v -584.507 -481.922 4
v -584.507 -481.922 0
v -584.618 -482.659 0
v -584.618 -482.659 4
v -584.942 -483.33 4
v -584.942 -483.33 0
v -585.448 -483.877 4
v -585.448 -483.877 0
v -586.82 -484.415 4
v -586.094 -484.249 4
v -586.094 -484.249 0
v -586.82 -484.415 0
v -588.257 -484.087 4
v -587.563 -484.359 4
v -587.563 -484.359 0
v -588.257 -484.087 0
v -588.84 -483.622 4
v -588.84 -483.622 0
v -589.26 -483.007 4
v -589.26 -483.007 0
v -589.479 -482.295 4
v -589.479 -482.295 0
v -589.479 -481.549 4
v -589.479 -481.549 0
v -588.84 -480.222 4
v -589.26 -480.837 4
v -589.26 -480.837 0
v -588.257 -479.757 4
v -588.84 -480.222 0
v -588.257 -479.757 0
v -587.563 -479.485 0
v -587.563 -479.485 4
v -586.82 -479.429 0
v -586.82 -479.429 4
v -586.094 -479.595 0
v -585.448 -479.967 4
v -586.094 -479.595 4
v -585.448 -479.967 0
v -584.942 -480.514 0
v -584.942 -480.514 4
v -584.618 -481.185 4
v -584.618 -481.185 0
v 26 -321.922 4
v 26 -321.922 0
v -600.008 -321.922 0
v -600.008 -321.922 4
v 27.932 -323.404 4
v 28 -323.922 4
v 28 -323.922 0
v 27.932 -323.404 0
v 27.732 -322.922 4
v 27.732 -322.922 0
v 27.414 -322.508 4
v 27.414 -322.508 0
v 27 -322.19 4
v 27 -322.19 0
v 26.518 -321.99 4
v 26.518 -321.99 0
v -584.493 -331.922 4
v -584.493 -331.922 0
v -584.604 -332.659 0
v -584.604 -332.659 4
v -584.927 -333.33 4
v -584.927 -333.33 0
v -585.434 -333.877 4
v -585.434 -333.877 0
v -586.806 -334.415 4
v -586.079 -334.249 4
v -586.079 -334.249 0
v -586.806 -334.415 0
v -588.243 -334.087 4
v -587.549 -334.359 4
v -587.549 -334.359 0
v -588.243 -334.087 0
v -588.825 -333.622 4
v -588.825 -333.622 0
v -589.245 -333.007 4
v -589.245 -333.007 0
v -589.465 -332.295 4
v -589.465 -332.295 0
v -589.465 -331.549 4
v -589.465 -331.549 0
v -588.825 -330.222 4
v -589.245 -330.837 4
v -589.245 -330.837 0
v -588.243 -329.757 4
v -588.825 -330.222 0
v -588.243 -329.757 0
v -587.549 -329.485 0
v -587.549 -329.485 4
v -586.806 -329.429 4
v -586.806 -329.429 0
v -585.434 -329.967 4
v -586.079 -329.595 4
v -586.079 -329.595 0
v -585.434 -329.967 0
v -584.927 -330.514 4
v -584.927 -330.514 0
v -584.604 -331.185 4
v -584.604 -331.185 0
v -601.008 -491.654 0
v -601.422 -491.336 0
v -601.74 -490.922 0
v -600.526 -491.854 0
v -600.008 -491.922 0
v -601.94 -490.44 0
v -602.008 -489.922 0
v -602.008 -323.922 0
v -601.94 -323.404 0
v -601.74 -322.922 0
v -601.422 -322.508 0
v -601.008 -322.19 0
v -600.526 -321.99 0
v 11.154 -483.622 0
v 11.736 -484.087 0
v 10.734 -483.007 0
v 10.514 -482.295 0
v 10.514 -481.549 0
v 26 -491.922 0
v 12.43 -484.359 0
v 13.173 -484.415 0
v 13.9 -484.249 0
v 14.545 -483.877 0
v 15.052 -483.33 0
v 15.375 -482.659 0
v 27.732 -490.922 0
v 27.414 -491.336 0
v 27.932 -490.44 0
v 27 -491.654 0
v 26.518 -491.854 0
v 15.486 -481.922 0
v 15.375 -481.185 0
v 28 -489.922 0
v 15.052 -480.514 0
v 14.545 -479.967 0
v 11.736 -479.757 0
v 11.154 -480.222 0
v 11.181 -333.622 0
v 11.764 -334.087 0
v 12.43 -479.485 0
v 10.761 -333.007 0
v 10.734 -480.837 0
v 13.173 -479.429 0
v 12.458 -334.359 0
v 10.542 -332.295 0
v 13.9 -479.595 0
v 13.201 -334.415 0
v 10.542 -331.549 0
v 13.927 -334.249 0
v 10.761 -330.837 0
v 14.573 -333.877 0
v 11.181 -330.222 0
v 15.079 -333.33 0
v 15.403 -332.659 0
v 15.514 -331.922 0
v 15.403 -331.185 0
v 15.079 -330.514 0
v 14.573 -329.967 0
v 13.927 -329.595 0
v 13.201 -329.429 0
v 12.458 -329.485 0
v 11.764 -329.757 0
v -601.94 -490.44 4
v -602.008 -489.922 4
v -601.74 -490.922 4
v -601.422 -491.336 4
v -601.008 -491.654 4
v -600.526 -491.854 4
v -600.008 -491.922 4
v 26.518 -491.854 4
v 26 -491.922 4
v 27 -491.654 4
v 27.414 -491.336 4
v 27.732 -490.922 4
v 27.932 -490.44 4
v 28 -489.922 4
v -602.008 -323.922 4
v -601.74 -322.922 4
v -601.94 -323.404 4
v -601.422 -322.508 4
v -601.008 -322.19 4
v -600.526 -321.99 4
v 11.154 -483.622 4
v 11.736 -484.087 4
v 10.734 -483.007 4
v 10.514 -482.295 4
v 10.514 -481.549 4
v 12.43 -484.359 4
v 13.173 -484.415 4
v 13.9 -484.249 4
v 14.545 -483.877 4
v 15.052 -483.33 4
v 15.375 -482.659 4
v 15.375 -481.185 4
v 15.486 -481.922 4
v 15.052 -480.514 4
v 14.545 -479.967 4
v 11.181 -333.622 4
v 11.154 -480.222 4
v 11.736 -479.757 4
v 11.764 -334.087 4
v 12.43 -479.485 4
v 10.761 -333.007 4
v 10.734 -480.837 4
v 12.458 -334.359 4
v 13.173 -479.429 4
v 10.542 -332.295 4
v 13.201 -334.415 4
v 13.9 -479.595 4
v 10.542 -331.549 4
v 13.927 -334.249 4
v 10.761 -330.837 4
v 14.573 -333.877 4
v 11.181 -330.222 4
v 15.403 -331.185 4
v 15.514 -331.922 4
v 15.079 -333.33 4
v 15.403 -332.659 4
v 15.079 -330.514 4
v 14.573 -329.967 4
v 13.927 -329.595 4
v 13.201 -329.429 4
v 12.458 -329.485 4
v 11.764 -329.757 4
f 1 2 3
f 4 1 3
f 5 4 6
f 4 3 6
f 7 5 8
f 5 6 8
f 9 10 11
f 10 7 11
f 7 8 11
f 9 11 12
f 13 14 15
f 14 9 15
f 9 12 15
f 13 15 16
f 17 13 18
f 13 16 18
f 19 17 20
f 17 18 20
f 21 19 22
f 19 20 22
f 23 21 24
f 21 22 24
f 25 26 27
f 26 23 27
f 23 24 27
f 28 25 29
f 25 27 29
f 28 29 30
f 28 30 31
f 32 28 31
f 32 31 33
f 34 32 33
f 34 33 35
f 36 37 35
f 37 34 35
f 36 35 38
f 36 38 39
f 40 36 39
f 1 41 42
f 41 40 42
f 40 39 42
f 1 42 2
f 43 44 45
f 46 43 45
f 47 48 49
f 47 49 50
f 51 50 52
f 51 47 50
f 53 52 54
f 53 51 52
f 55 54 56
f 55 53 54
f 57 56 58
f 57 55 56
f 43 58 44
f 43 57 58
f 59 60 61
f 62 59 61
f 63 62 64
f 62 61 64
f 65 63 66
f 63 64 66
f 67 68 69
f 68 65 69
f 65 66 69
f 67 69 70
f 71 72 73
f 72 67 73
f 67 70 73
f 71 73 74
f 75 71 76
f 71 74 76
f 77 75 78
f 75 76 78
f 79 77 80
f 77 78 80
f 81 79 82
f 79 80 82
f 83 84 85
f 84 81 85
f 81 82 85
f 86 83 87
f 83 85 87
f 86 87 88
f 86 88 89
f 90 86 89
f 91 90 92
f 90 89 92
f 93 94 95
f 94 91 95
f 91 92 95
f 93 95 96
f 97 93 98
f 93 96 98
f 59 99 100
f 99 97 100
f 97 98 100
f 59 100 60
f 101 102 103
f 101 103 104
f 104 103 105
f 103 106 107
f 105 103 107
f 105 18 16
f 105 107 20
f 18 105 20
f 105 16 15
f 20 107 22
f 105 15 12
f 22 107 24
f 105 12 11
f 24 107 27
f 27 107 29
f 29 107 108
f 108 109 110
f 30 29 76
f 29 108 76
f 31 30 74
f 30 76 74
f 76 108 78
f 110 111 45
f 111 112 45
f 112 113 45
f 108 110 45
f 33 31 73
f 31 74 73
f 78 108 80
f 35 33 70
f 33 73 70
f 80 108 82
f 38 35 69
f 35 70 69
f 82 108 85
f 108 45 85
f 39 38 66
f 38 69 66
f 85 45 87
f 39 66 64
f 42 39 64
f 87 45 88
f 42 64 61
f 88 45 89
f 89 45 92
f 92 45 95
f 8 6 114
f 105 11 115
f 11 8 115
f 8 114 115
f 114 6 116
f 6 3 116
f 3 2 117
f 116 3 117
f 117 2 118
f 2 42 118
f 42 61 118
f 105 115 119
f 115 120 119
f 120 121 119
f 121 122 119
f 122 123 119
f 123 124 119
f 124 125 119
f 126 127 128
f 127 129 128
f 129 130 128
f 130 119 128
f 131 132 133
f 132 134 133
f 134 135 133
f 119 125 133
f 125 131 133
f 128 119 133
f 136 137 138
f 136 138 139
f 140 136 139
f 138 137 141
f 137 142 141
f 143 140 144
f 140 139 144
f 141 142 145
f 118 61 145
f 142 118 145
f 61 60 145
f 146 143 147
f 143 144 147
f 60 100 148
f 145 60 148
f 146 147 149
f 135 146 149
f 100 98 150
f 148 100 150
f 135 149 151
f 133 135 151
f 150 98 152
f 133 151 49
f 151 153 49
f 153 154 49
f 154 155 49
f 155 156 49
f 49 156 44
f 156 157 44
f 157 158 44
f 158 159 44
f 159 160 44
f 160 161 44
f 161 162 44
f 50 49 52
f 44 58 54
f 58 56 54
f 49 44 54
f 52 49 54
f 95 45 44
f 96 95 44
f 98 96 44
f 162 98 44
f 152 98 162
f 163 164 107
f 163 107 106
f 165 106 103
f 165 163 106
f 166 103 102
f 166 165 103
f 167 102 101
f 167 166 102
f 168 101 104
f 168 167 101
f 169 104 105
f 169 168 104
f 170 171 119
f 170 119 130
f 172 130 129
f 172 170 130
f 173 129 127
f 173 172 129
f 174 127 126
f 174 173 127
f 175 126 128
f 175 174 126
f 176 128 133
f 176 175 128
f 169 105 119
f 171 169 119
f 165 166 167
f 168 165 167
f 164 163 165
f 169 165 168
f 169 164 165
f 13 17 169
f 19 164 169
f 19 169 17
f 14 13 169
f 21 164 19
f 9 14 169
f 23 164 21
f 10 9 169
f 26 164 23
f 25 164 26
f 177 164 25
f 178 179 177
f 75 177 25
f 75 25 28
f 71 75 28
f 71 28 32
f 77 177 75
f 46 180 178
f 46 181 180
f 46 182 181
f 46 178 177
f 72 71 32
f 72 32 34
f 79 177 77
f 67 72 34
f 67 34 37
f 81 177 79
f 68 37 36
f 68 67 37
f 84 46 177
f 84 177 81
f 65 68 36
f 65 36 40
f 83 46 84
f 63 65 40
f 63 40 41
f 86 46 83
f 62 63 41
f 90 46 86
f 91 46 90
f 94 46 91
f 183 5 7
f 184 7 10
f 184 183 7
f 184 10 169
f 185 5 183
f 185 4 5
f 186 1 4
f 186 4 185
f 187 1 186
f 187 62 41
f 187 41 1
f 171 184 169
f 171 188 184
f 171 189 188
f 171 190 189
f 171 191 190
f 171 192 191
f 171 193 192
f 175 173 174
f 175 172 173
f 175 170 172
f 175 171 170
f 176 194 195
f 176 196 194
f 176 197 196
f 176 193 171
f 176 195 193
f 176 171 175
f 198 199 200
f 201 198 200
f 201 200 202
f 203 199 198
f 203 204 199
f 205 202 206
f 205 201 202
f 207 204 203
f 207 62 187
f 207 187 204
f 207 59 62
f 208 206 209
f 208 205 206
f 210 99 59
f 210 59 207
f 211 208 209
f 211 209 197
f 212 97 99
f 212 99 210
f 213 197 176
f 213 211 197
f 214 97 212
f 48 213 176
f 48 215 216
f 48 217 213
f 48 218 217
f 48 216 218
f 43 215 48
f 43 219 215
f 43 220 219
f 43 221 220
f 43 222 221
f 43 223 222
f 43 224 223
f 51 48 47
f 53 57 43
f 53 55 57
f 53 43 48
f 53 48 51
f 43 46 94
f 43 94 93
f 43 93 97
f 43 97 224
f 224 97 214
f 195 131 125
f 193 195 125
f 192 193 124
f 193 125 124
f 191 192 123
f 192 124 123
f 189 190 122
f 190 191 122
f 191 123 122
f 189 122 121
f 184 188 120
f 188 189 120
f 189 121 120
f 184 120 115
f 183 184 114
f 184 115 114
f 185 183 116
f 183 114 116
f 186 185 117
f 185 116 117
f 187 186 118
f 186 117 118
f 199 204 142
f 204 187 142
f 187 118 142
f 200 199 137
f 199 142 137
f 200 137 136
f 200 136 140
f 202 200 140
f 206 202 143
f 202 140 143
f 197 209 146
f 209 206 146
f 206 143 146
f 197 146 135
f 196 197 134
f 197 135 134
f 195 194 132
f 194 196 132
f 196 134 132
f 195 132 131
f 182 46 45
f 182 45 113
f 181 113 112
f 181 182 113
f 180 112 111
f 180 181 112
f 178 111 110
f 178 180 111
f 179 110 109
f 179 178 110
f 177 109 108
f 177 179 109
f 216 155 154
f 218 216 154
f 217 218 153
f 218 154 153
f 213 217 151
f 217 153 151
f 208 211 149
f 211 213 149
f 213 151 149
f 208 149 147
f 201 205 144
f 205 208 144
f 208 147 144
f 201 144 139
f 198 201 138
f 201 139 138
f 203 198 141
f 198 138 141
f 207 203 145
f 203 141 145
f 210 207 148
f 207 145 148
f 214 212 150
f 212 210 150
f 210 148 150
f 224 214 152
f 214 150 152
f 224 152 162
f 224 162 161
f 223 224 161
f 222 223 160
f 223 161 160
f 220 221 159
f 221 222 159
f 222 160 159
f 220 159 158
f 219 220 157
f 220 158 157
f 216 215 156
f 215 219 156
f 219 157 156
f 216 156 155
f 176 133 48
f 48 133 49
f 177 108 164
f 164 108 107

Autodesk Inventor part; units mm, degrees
ref_plane "YZ Plane" through (0, 0, 0) normal (1, 0, 0) x (0, 1, 0)
ref_plane "XZ Plane" through (0, 0, 0) normal (0, 1, 0) x (-1, 0, 0)
ref_plane "XY Plane" through (0, 0, 0) normal (0, 0, 1) x (1, 0, 0)
sketch "Sketch1" plane through (0, 0, 0) normal (0, 0, 1) x (1, 0, 0)
  line L0 (-601.9604, 0.0293) -> (-602.0117, -529.9707) construction
  line L1 (28, -530) -> (28, 100) construction
  line L2 (-582.8507, 100.0274) -> (-582.9118, -529.9726) construction
  line L3 (-591.0507, 100.0282) -> (-582.8507, 100.0274) construction
  line L4 (-591.0507, 100.0282) -> (-591.1118, -529.9718) construction
  line L5 (-582.9118, -529.9726) -> (-591.1118, -529.9718) construction
  line L6 (17.1933, 99.9429) -> (17.0775, -530.057) construction
  line L7 (8.9933, 99.9444) -> (17.1933, 99.9429) construction
  line L8 (8.9933, 99.9444) -> (8.8775, -530.0555) construction
  line L9 (17.0775, -530.057) -> (8.8775, -530.0555) construction
  line L10 (12.9775, -530.0563) -> (13.0933, 99.9437) construction
  line L11 (-587.0118, -529.9722) -> (-586.9507, 100.0278) construction
  line L12 (-602.0081, -491.922) -> (28, -491.922)
  line L13 (28, -491.922) -> (28, -321.922)
  line L14 (28, -321.922) -> (-602.0081, -321.922)
  line L15 (-602.0081, -321.922) -> (-602.0081, -491.922)
  circle A0 centre (-587.0071, -481.922) radius 2.5
  circle A1 centre (-586.9926, -331.922) radius 2.5
  circle A2 centre (12.9863, -481.922) radius 2.5
  circle A3 centre (13.0139, -331.922) radius 2.5
  point P0 (0, 0)
  dimension "d0" = 170
  dimension "d1" = 5
  dimension "d2" = 5
  dimension "d3" = 5
  dimension "d4" = 5
  dimension "d5" = 10
  dimension "d6" = 10
  dimension "d7" = 10
  dimension "d8" = 10
extrude "Extrusion1" add sketch "Sketch1" along normal blind 4
fillet "Fillet1" radius 2 4 edges at (28, -491.922, 2) (28, -321.922, 2) (-602.0081, -321.922, 2) (-602.0081, -491.922, 2)
properties part number "Projector Mount"
